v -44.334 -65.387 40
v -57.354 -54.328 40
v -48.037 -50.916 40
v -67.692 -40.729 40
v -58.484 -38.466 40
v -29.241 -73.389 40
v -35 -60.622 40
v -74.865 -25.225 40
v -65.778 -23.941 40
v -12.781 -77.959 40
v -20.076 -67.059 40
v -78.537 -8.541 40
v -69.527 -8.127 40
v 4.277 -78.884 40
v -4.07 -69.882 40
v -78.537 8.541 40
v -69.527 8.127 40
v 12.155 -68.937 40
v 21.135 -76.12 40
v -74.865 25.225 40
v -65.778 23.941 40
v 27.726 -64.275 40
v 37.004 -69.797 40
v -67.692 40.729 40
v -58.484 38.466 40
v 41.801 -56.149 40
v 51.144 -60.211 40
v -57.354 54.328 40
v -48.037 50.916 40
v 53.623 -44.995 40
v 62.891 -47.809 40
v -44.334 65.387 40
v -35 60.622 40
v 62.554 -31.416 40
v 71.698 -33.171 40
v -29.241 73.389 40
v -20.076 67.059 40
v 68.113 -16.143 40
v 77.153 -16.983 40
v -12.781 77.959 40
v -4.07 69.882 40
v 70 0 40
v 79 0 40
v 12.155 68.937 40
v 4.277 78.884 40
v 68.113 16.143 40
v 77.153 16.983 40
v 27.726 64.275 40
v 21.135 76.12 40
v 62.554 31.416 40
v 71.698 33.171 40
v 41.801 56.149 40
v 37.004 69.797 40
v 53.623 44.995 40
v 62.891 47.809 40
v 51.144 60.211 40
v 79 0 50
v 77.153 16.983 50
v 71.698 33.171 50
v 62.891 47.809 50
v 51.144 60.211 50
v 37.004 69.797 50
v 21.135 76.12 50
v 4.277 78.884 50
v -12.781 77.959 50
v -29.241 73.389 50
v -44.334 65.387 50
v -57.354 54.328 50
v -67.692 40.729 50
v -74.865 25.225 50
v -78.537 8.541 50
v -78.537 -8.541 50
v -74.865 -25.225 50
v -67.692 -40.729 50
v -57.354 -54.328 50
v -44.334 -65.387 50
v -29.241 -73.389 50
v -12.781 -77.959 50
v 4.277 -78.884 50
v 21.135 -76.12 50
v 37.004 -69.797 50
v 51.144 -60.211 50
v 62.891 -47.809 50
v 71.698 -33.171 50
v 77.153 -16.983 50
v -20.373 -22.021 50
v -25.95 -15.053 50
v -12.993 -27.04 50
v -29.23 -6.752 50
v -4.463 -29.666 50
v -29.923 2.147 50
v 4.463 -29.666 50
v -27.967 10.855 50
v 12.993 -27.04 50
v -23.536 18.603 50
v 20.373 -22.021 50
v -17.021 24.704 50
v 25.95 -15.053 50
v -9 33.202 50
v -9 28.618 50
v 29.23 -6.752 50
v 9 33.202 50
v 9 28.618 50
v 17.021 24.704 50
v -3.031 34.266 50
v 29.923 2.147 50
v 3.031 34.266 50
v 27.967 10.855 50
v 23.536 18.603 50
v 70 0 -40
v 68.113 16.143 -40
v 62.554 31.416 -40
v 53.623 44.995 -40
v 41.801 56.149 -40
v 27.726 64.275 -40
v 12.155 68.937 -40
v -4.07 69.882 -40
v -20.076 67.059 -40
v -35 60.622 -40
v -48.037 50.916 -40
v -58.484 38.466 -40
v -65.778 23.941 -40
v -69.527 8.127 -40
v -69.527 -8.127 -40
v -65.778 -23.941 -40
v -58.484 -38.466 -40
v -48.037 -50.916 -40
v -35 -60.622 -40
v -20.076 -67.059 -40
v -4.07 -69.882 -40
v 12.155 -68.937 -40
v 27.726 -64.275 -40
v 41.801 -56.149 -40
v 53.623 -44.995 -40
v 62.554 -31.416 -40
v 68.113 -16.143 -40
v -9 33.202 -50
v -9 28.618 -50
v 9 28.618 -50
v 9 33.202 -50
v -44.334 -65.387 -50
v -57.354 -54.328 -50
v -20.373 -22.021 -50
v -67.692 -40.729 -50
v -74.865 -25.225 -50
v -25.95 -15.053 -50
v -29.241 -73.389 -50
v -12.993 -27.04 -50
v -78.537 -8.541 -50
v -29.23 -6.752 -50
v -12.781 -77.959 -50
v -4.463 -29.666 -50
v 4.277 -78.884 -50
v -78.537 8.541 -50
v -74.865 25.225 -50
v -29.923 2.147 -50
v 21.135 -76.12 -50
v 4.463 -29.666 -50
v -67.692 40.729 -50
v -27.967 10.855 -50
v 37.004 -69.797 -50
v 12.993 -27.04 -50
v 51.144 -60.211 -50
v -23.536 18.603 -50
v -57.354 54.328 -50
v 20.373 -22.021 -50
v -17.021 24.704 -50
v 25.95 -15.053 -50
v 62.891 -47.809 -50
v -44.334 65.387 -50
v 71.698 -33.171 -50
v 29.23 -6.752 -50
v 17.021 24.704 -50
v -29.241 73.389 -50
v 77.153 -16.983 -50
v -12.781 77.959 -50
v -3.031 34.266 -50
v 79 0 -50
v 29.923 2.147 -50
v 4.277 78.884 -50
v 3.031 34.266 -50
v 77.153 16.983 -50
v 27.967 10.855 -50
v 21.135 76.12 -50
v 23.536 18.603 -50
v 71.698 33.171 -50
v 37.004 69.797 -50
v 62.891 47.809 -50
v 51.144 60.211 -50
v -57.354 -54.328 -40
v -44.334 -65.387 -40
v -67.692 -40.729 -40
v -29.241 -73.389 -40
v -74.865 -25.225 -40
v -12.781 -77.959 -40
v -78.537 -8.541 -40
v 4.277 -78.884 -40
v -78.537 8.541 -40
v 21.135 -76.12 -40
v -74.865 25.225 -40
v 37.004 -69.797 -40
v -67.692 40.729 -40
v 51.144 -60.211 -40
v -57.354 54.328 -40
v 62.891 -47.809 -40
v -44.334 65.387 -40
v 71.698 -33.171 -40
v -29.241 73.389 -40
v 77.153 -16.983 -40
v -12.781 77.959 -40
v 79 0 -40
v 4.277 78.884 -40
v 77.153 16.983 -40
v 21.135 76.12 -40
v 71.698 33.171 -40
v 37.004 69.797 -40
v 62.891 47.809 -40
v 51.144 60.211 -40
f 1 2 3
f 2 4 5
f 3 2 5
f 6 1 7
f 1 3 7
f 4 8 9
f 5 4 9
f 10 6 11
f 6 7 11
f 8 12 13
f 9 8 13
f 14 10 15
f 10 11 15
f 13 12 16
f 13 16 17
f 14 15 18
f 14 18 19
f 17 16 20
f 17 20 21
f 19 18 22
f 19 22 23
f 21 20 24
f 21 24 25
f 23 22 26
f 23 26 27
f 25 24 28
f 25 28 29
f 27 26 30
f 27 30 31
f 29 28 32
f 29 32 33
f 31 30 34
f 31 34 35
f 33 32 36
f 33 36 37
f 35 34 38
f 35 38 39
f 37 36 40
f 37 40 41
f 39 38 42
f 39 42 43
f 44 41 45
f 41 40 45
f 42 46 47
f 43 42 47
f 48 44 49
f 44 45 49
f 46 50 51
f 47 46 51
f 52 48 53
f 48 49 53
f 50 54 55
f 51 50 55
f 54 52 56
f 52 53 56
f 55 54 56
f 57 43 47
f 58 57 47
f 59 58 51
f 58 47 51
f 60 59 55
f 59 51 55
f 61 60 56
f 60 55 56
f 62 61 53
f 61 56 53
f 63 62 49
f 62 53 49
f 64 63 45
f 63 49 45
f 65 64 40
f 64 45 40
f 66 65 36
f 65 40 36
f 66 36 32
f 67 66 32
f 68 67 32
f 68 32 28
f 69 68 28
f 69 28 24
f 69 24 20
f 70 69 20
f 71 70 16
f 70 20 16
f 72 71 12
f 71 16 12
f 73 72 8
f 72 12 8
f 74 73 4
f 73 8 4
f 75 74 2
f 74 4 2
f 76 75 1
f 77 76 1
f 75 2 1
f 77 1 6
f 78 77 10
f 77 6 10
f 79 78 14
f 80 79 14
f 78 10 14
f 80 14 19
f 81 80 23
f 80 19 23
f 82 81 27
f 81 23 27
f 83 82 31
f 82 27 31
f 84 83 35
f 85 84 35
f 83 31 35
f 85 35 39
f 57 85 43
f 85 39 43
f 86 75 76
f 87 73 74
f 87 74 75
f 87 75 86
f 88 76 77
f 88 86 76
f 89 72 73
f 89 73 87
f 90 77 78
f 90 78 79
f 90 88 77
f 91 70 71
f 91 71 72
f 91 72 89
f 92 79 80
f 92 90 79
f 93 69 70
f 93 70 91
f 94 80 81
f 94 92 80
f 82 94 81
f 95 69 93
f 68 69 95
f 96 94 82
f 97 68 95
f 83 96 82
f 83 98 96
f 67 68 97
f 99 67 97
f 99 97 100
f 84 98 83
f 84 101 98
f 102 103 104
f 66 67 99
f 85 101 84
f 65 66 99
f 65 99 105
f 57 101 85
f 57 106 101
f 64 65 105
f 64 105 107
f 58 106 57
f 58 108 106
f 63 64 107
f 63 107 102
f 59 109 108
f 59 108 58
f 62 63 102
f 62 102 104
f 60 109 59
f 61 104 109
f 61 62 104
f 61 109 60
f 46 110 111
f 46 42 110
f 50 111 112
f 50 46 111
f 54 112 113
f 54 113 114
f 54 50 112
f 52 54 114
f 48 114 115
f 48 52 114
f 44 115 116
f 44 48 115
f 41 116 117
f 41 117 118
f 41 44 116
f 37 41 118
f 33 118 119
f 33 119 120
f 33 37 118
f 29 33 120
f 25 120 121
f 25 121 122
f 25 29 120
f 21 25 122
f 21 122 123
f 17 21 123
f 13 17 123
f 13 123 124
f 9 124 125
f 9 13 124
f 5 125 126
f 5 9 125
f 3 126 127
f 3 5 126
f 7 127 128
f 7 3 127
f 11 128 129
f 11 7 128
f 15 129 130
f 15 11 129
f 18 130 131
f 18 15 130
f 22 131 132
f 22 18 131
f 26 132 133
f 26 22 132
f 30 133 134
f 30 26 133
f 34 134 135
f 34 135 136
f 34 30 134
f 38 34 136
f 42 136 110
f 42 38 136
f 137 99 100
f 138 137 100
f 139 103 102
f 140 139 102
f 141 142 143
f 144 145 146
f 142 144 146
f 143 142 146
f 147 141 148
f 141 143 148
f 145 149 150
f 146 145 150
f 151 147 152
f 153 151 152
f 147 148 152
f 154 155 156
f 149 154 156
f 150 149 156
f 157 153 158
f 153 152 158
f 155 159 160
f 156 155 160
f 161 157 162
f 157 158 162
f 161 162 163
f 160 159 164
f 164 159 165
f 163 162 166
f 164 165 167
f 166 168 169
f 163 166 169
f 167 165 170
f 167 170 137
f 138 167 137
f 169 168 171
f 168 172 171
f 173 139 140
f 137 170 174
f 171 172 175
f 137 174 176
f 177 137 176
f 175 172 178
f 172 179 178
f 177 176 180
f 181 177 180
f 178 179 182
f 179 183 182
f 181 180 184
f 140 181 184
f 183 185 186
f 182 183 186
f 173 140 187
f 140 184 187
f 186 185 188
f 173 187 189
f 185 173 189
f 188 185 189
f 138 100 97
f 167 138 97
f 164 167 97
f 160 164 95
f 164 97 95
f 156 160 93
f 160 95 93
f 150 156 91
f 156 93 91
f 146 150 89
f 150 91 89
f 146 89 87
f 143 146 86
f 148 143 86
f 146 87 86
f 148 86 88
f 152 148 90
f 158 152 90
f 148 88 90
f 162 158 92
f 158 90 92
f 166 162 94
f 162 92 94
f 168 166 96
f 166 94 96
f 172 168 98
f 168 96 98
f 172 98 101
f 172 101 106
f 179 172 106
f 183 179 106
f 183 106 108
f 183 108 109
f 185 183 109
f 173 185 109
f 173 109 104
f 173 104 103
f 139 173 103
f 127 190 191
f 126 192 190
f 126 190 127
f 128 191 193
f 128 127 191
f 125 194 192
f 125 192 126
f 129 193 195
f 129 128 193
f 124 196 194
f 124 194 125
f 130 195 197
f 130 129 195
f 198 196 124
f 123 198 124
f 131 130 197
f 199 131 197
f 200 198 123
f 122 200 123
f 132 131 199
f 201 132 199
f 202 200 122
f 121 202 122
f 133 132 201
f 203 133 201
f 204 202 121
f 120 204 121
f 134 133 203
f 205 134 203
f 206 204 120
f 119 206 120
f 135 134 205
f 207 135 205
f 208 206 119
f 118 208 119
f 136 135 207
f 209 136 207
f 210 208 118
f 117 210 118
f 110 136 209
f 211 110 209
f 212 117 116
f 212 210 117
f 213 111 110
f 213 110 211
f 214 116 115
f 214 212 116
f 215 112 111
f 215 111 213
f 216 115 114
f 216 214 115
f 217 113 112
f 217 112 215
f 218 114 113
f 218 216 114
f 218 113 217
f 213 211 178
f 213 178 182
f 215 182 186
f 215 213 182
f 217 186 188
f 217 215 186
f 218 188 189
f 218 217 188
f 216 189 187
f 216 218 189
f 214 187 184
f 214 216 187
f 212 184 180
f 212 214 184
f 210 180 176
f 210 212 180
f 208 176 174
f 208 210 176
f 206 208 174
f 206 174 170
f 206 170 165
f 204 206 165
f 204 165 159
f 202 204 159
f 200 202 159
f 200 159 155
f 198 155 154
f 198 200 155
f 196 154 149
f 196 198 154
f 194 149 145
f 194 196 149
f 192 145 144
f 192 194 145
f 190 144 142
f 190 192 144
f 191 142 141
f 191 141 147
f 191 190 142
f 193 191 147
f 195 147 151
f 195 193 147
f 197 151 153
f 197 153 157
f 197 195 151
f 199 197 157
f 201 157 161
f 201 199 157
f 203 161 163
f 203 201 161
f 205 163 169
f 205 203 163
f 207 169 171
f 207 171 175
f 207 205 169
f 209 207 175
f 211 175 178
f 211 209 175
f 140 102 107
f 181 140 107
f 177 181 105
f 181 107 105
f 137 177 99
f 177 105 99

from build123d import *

# Parameters (mm, degrees)
SKETCH1_R           = 70
SKETCH1_R_2         = 30
BOSS_EXTRUDE1_DEPTH = 40
SKETCH2_R           = 79
SKETCH2_R_2         = 30
BOSS_EXTRUDE2_DEPTH = 10
CUT_EXTRUDE1_DEPTH  = 150.939987995


with BuildPart() as part:
    # Sketch1 → Boss-Extrude1 (new, symmetric)
    with BuildSketch(Plane.XY):
        Circle(SKETCH1_R)
        Circle(SKETCH1_R_2, mode=Mode.SUBTRACT)
    extrude(amount=BOSS_EXTRUDE1_DEPTH, both=True)

    # Sketch2 → Boss-Extrude2 (add)
    with BuildSketch(Plane.XY.offset(40)):
        Circle(SKETCH2_R)
        Circle(SKETCH2_R_2, mode=Mode.SUBTRACT)
    boss_extrude2 = extrude(amount=BOSS_EXTRUDE2_DEPTH)

    # Mirror1: Boss-Extrude2 across plane
    add(boss_extrude2.mirror(Plane.XY))

    # Sketch3 → Cut-Extrude1 (cut, through all)
    with BuildSketch(Plane.XY.offset(50)):
        with BuildLine():
            Line((9, 16.370254424), (9, 33.20180718))
            ThreePointArc((9, 33.20180718), (0, 34.4), (-9, 33.20180718))
            Line((-9, 33.20180718), (-9, 16.370254424))
            Line((-9, 16.370254424), (9, 16.370254424))
        make_face()
    extrude(amount=-CUT_EXTRUDE1_DEPTH, mode=Mode.SUBTRACT)


solid = part.part
